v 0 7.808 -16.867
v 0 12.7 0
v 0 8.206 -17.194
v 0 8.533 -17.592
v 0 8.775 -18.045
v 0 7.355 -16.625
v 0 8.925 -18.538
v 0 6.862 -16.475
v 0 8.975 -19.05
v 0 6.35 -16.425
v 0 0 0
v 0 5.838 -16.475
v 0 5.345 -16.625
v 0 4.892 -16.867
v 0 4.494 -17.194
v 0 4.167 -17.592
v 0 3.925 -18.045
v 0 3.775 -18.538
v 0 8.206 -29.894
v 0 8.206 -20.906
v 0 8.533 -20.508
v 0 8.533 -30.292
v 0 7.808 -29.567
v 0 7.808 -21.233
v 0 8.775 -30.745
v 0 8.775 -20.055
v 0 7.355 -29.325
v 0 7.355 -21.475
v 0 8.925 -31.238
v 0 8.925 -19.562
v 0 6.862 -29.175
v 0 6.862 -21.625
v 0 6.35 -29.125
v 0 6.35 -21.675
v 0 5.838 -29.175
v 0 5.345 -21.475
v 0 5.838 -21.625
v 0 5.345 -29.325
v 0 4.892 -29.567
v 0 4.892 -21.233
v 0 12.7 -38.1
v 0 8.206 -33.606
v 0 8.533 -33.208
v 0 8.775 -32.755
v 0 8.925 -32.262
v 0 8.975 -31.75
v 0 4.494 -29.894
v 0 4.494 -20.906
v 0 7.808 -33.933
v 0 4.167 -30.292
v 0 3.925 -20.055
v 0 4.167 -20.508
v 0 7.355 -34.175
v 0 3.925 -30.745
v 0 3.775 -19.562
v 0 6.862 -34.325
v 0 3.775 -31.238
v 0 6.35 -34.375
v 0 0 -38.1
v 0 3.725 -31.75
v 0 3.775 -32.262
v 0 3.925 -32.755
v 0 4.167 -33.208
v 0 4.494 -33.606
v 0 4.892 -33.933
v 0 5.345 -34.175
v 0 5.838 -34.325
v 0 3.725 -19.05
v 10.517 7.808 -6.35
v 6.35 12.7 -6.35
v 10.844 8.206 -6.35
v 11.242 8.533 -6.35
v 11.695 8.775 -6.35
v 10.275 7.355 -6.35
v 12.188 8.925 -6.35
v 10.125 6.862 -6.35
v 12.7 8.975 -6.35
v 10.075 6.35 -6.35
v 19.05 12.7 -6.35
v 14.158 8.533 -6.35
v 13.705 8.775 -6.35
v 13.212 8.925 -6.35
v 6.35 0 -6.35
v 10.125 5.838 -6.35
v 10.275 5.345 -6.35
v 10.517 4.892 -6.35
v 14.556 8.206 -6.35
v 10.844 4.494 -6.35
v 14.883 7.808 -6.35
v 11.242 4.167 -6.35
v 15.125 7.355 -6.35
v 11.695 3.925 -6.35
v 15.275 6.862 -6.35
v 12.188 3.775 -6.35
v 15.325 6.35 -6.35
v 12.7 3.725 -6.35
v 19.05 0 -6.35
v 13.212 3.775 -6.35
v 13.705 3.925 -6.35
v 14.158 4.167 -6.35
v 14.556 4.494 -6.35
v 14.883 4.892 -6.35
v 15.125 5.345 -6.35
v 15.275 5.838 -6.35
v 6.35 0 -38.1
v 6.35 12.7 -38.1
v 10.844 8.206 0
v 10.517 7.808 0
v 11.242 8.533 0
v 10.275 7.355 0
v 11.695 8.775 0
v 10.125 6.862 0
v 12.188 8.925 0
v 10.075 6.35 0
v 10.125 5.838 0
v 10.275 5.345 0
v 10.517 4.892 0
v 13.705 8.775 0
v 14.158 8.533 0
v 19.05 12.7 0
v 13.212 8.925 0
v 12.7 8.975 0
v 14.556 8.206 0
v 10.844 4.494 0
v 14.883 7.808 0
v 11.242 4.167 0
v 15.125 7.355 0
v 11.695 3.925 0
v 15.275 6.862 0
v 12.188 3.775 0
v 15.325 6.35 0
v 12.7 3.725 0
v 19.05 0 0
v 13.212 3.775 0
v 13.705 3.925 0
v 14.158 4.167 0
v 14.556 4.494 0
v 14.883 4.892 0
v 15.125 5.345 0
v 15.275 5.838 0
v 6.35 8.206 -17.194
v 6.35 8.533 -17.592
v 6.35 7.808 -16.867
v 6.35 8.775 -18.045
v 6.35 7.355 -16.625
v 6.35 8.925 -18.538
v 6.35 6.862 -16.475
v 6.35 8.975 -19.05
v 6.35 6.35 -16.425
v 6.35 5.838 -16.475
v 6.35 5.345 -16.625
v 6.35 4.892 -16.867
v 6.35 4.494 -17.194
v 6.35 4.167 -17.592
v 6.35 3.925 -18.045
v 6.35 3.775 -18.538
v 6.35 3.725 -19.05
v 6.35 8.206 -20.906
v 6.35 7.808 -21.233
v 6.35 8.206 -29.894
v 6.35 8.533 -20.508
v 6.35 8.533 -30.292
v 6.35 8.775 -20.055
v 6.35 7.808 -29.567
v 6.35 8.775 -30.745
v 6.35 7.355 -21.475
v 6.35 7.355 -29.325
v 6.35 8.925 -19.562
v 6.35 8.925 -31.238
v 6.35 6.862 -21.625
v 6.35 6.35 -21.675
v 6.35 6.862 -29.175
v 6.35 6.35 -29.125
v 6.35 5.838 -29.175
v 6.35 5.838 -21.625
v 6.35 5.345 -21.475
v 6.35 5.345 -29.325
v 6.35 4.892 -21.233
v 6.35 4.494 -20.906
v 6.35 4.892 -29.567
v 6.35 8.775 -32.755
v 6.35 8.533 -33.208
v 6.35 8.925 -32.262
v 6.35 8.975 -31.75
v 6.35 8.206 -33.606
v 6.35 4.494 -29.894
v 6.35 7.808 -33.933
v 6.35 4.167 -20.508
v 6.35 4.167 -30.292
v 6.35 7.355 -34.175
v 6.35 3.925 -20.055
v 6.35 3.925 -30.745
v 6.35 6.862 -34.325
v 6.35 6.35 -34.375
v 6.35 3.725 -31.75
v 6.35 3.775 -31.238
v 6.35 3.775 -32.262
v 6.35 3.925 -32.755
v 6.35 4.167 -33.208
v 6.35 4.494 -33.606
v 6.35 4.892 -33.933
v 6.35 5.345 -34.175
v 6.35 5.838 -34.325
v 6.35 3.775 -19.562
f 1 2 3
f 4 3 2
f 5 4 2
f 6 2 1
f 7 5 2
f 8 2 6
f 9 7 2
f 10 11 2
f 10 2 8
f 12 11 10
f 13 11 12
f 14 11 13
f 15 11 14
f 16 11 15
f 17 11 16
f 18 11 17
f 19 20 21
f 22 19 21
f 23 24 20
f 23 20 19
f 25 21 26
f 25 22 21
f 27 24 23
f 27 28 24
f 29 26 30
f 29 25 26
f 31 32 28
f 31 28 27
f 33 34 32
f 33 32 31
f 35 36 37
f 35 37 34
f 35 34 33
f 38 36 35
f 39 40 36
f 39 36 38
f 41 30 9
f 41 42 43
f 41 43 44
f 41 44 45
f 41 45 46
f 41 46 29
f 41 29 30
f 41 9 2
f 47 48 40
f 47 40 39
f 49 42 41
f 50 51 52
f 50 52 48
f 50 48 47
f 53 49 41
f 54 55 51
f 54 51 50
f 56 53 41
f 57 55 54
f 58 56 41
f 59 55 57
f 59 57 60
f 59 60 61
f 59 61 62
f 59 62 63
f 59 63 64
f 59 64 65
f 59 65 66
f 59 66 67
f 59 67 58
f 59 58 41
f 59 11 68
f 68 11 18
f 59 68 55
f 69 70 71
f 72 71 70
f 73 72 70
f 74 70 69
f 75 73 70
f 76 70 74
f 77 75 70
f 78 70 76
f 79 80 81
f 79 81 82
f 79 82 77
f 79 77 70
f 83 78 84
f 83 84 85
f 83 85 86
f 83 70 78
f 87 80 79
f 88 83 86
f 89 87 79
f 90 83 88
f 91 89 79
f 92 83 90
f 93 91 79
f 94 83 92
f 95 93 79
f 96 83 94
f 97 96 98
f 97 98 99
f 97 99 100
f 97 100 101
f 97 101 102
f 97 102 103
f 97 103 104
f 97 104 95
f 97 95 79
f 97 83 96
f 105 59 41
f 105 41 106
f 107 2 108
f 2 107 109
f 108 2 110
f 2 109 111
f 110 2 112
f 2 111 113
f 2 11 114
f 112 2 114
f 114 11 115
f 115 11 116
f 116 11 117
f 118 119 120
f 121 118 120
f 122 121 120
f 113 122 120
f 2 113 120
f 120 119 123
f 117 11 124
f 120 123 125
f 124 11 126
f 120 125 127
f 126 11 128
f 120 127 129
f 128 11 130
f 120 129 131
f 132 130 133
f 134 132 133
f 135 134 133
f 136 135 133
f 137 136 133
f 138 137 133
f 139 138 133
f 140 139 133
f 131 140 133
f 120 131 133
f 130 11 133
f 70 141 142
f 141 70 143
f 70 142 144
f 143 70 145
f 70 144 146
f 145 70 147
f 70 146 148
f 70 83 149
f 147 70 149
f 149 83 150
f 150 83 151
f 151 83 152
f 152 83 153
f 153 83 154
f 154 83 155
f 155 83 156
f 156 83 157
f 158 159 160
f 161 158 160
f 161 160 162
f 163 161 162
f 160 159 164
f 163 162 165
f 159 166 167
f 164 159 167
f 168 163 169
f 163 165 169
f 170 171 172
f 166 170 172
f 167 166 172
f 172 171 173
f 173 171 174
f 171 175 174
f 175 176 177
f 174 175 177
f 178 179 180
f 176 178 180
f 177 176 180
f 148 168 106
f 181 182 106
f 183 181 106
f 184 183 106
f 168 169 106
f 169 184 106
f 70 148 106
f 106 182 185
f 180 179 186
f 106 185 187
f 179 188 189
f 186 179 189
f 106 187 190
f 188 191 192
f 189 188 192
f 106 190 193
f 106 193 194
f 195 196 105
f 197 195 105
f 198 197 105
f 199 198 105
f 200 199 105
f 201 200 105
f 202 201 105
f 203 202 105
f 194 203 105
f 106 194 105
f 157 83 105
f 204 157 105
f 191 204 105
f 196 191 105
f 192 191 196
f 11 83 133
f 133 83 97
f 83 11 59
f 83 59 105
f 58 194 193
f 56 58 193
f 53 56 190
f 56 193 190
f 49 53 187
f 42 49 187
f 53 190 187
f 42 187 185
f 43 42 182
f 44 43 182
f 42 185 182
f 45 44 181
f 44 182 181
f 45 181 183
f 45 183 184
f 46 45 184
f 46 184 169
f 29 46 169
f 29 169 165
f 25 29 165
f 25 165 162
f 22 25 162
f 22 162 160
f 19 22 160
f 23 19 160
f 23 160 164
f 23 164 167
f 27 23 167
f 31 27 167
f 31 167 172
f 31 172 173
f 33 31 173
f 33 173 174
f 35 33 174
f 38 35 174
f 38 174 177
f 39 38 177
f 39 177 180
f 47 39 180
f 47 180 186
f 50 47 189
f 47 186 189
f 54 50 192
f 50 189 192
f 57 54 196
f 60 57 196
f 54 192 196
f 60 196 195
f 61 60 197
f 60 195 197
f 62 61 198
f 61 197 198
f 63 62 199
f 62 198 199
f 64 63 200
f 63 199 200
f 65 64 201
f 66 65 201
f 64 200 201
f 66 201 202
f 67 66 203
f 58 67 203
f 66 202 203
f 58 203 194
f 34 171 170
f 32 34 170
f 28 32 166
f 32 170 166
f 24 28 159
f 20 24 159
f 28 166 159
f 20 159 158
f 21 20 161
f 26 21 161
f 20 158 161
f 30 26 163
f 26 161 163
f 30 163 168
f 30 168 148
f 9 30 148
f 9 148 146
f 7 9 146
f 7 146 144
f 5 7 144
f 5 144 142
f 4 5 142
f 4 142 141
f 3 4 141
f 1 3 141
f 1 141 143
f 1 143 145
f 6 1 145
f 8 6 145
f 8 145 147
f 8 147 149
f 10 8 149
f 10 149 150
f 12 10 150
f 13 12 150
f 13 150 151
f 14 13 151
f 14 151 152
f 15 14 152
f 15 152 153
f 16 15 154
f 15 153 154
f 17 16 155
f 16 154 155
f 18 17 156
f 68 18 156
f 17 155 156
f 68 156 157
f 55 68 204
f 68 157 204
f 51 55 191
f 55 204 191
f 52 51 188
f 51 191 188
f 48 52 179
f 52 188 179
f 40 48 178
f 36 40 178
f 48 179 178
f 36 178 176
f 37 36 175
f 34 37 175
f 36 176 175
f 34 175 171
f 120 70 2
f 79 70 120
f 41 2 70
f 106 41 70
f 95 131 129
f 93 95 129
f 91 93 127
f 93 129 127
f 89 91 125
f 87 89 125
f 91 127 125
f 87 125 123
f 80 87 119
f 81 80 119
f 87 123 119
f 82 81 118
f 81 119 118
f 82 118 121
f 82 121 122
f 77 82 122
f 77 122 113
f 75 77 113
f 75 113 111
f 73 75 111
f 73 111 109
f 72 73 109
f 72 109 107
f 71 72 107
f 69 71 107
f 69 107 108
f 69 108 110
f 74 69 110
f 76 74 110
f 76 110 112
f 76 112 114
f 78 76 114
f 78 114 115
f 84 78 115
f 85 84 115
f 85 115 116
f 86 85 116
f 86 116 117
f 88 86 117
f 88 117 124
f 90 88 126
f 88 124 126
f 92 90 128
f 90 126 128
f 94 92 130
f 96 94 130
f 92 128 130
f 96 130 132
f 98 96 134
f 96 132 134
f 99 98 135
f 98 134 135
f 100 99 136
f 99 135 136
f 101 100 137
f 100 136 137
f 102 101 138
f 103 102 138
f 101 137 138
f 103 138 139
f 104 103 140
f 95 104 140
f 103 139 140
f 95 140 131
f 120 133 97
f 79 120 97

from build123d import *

# Parameters (mm, degrees)
SKETCH1_W                 = 6.35
SKETCH1_H                 = 38.1
SKETCH1_W_2               = 12.7
SKETCH1_H_2               = 6.35
BOSS_EXTRUDE1_DEPTH       = 12.7
F_5_0MM_DOWEL_HOLE1_D     = 5.25
F_5_0MM_DOWEL_HOLE1_DEPTH = 9.906
F_5_0MM_DOWEL_HOLE1_TIP   = 1.577259125
F_5_0MM_DOWEL_HOLE2_D     = 5.25
F_5_0MM_DOWEL_HOLE2_DEPTH = 9.906
F_5_0MM_DOWEL_HOLE2_TIP   = 1.577259125


with BuildPart() as part:
    # Sketch1 → Boss-Extrude1 (new body)
    with BuildSketch(Plane(origin=(0, 0, 0), x_dir=(1, 0, 0), z_dir=(0, 1, 0))):
        with Locations((3.175, 19.05)):
            Rectangle(SKETCH1_W, SKETCH1_H)
        with Locations((12.7, 3.175)):
            Rectangle(SKETCH1_W_2, SKETCH1_H_2)
    extrude(amount=BOSS_EXTRUDE1_DEPTH)

    # Ø5.0mm Dowel Hole1
    with Locations(Plane.ZY):
        with Locations((-31.75, 6.35), (-19.05, 6.35)):
            Hole(F_5_0MM_DOWEL_HOLE1_D / 2, depth=F_5_0MM_DOWEL_HOLE1_DEPTH)
            with Locations((0, 0, -(F_5_0MM_DOWEL_HOLE1_DEPTH + F_5_0MM_DOWEL_HOLE1_TIP / 2))):  # 118° drill point
                Cone(0, F_5_0MM_DOWEL_HOLE1_D / 2, F_5_0MM_DOWEL_HOLE1_TIP, mode=Mode.SUBTRACT)

    # Ø5.0mm Dowel Hole2
    with Locations(Plane(origin=(0, 0, -6.35), x_dir=(-1, 0, 0), z_dir=(0, 0, -1))):
        with Locations((-12.7, 6.35)):
            Hole(F_5_0MM_DOWEL_HOLE2_D / 2, depth=F_5_0MM_DOWEL_HOLE2_DEPTH)
            with Locations((0, 0, -(F_5_0MM_DOWEL_HOLE2_DEPTH + F_5_0MM_DOWEL_HOLE2_TIP / 2))):  # 118° drill point
                Cone(0, F_5_0MM_DOWEL_HOLE2_D / 2, F_5_0MM_DOWEL_HOLE2_TIP, mode=Mode.SUBTRACT)


solid = part.part
